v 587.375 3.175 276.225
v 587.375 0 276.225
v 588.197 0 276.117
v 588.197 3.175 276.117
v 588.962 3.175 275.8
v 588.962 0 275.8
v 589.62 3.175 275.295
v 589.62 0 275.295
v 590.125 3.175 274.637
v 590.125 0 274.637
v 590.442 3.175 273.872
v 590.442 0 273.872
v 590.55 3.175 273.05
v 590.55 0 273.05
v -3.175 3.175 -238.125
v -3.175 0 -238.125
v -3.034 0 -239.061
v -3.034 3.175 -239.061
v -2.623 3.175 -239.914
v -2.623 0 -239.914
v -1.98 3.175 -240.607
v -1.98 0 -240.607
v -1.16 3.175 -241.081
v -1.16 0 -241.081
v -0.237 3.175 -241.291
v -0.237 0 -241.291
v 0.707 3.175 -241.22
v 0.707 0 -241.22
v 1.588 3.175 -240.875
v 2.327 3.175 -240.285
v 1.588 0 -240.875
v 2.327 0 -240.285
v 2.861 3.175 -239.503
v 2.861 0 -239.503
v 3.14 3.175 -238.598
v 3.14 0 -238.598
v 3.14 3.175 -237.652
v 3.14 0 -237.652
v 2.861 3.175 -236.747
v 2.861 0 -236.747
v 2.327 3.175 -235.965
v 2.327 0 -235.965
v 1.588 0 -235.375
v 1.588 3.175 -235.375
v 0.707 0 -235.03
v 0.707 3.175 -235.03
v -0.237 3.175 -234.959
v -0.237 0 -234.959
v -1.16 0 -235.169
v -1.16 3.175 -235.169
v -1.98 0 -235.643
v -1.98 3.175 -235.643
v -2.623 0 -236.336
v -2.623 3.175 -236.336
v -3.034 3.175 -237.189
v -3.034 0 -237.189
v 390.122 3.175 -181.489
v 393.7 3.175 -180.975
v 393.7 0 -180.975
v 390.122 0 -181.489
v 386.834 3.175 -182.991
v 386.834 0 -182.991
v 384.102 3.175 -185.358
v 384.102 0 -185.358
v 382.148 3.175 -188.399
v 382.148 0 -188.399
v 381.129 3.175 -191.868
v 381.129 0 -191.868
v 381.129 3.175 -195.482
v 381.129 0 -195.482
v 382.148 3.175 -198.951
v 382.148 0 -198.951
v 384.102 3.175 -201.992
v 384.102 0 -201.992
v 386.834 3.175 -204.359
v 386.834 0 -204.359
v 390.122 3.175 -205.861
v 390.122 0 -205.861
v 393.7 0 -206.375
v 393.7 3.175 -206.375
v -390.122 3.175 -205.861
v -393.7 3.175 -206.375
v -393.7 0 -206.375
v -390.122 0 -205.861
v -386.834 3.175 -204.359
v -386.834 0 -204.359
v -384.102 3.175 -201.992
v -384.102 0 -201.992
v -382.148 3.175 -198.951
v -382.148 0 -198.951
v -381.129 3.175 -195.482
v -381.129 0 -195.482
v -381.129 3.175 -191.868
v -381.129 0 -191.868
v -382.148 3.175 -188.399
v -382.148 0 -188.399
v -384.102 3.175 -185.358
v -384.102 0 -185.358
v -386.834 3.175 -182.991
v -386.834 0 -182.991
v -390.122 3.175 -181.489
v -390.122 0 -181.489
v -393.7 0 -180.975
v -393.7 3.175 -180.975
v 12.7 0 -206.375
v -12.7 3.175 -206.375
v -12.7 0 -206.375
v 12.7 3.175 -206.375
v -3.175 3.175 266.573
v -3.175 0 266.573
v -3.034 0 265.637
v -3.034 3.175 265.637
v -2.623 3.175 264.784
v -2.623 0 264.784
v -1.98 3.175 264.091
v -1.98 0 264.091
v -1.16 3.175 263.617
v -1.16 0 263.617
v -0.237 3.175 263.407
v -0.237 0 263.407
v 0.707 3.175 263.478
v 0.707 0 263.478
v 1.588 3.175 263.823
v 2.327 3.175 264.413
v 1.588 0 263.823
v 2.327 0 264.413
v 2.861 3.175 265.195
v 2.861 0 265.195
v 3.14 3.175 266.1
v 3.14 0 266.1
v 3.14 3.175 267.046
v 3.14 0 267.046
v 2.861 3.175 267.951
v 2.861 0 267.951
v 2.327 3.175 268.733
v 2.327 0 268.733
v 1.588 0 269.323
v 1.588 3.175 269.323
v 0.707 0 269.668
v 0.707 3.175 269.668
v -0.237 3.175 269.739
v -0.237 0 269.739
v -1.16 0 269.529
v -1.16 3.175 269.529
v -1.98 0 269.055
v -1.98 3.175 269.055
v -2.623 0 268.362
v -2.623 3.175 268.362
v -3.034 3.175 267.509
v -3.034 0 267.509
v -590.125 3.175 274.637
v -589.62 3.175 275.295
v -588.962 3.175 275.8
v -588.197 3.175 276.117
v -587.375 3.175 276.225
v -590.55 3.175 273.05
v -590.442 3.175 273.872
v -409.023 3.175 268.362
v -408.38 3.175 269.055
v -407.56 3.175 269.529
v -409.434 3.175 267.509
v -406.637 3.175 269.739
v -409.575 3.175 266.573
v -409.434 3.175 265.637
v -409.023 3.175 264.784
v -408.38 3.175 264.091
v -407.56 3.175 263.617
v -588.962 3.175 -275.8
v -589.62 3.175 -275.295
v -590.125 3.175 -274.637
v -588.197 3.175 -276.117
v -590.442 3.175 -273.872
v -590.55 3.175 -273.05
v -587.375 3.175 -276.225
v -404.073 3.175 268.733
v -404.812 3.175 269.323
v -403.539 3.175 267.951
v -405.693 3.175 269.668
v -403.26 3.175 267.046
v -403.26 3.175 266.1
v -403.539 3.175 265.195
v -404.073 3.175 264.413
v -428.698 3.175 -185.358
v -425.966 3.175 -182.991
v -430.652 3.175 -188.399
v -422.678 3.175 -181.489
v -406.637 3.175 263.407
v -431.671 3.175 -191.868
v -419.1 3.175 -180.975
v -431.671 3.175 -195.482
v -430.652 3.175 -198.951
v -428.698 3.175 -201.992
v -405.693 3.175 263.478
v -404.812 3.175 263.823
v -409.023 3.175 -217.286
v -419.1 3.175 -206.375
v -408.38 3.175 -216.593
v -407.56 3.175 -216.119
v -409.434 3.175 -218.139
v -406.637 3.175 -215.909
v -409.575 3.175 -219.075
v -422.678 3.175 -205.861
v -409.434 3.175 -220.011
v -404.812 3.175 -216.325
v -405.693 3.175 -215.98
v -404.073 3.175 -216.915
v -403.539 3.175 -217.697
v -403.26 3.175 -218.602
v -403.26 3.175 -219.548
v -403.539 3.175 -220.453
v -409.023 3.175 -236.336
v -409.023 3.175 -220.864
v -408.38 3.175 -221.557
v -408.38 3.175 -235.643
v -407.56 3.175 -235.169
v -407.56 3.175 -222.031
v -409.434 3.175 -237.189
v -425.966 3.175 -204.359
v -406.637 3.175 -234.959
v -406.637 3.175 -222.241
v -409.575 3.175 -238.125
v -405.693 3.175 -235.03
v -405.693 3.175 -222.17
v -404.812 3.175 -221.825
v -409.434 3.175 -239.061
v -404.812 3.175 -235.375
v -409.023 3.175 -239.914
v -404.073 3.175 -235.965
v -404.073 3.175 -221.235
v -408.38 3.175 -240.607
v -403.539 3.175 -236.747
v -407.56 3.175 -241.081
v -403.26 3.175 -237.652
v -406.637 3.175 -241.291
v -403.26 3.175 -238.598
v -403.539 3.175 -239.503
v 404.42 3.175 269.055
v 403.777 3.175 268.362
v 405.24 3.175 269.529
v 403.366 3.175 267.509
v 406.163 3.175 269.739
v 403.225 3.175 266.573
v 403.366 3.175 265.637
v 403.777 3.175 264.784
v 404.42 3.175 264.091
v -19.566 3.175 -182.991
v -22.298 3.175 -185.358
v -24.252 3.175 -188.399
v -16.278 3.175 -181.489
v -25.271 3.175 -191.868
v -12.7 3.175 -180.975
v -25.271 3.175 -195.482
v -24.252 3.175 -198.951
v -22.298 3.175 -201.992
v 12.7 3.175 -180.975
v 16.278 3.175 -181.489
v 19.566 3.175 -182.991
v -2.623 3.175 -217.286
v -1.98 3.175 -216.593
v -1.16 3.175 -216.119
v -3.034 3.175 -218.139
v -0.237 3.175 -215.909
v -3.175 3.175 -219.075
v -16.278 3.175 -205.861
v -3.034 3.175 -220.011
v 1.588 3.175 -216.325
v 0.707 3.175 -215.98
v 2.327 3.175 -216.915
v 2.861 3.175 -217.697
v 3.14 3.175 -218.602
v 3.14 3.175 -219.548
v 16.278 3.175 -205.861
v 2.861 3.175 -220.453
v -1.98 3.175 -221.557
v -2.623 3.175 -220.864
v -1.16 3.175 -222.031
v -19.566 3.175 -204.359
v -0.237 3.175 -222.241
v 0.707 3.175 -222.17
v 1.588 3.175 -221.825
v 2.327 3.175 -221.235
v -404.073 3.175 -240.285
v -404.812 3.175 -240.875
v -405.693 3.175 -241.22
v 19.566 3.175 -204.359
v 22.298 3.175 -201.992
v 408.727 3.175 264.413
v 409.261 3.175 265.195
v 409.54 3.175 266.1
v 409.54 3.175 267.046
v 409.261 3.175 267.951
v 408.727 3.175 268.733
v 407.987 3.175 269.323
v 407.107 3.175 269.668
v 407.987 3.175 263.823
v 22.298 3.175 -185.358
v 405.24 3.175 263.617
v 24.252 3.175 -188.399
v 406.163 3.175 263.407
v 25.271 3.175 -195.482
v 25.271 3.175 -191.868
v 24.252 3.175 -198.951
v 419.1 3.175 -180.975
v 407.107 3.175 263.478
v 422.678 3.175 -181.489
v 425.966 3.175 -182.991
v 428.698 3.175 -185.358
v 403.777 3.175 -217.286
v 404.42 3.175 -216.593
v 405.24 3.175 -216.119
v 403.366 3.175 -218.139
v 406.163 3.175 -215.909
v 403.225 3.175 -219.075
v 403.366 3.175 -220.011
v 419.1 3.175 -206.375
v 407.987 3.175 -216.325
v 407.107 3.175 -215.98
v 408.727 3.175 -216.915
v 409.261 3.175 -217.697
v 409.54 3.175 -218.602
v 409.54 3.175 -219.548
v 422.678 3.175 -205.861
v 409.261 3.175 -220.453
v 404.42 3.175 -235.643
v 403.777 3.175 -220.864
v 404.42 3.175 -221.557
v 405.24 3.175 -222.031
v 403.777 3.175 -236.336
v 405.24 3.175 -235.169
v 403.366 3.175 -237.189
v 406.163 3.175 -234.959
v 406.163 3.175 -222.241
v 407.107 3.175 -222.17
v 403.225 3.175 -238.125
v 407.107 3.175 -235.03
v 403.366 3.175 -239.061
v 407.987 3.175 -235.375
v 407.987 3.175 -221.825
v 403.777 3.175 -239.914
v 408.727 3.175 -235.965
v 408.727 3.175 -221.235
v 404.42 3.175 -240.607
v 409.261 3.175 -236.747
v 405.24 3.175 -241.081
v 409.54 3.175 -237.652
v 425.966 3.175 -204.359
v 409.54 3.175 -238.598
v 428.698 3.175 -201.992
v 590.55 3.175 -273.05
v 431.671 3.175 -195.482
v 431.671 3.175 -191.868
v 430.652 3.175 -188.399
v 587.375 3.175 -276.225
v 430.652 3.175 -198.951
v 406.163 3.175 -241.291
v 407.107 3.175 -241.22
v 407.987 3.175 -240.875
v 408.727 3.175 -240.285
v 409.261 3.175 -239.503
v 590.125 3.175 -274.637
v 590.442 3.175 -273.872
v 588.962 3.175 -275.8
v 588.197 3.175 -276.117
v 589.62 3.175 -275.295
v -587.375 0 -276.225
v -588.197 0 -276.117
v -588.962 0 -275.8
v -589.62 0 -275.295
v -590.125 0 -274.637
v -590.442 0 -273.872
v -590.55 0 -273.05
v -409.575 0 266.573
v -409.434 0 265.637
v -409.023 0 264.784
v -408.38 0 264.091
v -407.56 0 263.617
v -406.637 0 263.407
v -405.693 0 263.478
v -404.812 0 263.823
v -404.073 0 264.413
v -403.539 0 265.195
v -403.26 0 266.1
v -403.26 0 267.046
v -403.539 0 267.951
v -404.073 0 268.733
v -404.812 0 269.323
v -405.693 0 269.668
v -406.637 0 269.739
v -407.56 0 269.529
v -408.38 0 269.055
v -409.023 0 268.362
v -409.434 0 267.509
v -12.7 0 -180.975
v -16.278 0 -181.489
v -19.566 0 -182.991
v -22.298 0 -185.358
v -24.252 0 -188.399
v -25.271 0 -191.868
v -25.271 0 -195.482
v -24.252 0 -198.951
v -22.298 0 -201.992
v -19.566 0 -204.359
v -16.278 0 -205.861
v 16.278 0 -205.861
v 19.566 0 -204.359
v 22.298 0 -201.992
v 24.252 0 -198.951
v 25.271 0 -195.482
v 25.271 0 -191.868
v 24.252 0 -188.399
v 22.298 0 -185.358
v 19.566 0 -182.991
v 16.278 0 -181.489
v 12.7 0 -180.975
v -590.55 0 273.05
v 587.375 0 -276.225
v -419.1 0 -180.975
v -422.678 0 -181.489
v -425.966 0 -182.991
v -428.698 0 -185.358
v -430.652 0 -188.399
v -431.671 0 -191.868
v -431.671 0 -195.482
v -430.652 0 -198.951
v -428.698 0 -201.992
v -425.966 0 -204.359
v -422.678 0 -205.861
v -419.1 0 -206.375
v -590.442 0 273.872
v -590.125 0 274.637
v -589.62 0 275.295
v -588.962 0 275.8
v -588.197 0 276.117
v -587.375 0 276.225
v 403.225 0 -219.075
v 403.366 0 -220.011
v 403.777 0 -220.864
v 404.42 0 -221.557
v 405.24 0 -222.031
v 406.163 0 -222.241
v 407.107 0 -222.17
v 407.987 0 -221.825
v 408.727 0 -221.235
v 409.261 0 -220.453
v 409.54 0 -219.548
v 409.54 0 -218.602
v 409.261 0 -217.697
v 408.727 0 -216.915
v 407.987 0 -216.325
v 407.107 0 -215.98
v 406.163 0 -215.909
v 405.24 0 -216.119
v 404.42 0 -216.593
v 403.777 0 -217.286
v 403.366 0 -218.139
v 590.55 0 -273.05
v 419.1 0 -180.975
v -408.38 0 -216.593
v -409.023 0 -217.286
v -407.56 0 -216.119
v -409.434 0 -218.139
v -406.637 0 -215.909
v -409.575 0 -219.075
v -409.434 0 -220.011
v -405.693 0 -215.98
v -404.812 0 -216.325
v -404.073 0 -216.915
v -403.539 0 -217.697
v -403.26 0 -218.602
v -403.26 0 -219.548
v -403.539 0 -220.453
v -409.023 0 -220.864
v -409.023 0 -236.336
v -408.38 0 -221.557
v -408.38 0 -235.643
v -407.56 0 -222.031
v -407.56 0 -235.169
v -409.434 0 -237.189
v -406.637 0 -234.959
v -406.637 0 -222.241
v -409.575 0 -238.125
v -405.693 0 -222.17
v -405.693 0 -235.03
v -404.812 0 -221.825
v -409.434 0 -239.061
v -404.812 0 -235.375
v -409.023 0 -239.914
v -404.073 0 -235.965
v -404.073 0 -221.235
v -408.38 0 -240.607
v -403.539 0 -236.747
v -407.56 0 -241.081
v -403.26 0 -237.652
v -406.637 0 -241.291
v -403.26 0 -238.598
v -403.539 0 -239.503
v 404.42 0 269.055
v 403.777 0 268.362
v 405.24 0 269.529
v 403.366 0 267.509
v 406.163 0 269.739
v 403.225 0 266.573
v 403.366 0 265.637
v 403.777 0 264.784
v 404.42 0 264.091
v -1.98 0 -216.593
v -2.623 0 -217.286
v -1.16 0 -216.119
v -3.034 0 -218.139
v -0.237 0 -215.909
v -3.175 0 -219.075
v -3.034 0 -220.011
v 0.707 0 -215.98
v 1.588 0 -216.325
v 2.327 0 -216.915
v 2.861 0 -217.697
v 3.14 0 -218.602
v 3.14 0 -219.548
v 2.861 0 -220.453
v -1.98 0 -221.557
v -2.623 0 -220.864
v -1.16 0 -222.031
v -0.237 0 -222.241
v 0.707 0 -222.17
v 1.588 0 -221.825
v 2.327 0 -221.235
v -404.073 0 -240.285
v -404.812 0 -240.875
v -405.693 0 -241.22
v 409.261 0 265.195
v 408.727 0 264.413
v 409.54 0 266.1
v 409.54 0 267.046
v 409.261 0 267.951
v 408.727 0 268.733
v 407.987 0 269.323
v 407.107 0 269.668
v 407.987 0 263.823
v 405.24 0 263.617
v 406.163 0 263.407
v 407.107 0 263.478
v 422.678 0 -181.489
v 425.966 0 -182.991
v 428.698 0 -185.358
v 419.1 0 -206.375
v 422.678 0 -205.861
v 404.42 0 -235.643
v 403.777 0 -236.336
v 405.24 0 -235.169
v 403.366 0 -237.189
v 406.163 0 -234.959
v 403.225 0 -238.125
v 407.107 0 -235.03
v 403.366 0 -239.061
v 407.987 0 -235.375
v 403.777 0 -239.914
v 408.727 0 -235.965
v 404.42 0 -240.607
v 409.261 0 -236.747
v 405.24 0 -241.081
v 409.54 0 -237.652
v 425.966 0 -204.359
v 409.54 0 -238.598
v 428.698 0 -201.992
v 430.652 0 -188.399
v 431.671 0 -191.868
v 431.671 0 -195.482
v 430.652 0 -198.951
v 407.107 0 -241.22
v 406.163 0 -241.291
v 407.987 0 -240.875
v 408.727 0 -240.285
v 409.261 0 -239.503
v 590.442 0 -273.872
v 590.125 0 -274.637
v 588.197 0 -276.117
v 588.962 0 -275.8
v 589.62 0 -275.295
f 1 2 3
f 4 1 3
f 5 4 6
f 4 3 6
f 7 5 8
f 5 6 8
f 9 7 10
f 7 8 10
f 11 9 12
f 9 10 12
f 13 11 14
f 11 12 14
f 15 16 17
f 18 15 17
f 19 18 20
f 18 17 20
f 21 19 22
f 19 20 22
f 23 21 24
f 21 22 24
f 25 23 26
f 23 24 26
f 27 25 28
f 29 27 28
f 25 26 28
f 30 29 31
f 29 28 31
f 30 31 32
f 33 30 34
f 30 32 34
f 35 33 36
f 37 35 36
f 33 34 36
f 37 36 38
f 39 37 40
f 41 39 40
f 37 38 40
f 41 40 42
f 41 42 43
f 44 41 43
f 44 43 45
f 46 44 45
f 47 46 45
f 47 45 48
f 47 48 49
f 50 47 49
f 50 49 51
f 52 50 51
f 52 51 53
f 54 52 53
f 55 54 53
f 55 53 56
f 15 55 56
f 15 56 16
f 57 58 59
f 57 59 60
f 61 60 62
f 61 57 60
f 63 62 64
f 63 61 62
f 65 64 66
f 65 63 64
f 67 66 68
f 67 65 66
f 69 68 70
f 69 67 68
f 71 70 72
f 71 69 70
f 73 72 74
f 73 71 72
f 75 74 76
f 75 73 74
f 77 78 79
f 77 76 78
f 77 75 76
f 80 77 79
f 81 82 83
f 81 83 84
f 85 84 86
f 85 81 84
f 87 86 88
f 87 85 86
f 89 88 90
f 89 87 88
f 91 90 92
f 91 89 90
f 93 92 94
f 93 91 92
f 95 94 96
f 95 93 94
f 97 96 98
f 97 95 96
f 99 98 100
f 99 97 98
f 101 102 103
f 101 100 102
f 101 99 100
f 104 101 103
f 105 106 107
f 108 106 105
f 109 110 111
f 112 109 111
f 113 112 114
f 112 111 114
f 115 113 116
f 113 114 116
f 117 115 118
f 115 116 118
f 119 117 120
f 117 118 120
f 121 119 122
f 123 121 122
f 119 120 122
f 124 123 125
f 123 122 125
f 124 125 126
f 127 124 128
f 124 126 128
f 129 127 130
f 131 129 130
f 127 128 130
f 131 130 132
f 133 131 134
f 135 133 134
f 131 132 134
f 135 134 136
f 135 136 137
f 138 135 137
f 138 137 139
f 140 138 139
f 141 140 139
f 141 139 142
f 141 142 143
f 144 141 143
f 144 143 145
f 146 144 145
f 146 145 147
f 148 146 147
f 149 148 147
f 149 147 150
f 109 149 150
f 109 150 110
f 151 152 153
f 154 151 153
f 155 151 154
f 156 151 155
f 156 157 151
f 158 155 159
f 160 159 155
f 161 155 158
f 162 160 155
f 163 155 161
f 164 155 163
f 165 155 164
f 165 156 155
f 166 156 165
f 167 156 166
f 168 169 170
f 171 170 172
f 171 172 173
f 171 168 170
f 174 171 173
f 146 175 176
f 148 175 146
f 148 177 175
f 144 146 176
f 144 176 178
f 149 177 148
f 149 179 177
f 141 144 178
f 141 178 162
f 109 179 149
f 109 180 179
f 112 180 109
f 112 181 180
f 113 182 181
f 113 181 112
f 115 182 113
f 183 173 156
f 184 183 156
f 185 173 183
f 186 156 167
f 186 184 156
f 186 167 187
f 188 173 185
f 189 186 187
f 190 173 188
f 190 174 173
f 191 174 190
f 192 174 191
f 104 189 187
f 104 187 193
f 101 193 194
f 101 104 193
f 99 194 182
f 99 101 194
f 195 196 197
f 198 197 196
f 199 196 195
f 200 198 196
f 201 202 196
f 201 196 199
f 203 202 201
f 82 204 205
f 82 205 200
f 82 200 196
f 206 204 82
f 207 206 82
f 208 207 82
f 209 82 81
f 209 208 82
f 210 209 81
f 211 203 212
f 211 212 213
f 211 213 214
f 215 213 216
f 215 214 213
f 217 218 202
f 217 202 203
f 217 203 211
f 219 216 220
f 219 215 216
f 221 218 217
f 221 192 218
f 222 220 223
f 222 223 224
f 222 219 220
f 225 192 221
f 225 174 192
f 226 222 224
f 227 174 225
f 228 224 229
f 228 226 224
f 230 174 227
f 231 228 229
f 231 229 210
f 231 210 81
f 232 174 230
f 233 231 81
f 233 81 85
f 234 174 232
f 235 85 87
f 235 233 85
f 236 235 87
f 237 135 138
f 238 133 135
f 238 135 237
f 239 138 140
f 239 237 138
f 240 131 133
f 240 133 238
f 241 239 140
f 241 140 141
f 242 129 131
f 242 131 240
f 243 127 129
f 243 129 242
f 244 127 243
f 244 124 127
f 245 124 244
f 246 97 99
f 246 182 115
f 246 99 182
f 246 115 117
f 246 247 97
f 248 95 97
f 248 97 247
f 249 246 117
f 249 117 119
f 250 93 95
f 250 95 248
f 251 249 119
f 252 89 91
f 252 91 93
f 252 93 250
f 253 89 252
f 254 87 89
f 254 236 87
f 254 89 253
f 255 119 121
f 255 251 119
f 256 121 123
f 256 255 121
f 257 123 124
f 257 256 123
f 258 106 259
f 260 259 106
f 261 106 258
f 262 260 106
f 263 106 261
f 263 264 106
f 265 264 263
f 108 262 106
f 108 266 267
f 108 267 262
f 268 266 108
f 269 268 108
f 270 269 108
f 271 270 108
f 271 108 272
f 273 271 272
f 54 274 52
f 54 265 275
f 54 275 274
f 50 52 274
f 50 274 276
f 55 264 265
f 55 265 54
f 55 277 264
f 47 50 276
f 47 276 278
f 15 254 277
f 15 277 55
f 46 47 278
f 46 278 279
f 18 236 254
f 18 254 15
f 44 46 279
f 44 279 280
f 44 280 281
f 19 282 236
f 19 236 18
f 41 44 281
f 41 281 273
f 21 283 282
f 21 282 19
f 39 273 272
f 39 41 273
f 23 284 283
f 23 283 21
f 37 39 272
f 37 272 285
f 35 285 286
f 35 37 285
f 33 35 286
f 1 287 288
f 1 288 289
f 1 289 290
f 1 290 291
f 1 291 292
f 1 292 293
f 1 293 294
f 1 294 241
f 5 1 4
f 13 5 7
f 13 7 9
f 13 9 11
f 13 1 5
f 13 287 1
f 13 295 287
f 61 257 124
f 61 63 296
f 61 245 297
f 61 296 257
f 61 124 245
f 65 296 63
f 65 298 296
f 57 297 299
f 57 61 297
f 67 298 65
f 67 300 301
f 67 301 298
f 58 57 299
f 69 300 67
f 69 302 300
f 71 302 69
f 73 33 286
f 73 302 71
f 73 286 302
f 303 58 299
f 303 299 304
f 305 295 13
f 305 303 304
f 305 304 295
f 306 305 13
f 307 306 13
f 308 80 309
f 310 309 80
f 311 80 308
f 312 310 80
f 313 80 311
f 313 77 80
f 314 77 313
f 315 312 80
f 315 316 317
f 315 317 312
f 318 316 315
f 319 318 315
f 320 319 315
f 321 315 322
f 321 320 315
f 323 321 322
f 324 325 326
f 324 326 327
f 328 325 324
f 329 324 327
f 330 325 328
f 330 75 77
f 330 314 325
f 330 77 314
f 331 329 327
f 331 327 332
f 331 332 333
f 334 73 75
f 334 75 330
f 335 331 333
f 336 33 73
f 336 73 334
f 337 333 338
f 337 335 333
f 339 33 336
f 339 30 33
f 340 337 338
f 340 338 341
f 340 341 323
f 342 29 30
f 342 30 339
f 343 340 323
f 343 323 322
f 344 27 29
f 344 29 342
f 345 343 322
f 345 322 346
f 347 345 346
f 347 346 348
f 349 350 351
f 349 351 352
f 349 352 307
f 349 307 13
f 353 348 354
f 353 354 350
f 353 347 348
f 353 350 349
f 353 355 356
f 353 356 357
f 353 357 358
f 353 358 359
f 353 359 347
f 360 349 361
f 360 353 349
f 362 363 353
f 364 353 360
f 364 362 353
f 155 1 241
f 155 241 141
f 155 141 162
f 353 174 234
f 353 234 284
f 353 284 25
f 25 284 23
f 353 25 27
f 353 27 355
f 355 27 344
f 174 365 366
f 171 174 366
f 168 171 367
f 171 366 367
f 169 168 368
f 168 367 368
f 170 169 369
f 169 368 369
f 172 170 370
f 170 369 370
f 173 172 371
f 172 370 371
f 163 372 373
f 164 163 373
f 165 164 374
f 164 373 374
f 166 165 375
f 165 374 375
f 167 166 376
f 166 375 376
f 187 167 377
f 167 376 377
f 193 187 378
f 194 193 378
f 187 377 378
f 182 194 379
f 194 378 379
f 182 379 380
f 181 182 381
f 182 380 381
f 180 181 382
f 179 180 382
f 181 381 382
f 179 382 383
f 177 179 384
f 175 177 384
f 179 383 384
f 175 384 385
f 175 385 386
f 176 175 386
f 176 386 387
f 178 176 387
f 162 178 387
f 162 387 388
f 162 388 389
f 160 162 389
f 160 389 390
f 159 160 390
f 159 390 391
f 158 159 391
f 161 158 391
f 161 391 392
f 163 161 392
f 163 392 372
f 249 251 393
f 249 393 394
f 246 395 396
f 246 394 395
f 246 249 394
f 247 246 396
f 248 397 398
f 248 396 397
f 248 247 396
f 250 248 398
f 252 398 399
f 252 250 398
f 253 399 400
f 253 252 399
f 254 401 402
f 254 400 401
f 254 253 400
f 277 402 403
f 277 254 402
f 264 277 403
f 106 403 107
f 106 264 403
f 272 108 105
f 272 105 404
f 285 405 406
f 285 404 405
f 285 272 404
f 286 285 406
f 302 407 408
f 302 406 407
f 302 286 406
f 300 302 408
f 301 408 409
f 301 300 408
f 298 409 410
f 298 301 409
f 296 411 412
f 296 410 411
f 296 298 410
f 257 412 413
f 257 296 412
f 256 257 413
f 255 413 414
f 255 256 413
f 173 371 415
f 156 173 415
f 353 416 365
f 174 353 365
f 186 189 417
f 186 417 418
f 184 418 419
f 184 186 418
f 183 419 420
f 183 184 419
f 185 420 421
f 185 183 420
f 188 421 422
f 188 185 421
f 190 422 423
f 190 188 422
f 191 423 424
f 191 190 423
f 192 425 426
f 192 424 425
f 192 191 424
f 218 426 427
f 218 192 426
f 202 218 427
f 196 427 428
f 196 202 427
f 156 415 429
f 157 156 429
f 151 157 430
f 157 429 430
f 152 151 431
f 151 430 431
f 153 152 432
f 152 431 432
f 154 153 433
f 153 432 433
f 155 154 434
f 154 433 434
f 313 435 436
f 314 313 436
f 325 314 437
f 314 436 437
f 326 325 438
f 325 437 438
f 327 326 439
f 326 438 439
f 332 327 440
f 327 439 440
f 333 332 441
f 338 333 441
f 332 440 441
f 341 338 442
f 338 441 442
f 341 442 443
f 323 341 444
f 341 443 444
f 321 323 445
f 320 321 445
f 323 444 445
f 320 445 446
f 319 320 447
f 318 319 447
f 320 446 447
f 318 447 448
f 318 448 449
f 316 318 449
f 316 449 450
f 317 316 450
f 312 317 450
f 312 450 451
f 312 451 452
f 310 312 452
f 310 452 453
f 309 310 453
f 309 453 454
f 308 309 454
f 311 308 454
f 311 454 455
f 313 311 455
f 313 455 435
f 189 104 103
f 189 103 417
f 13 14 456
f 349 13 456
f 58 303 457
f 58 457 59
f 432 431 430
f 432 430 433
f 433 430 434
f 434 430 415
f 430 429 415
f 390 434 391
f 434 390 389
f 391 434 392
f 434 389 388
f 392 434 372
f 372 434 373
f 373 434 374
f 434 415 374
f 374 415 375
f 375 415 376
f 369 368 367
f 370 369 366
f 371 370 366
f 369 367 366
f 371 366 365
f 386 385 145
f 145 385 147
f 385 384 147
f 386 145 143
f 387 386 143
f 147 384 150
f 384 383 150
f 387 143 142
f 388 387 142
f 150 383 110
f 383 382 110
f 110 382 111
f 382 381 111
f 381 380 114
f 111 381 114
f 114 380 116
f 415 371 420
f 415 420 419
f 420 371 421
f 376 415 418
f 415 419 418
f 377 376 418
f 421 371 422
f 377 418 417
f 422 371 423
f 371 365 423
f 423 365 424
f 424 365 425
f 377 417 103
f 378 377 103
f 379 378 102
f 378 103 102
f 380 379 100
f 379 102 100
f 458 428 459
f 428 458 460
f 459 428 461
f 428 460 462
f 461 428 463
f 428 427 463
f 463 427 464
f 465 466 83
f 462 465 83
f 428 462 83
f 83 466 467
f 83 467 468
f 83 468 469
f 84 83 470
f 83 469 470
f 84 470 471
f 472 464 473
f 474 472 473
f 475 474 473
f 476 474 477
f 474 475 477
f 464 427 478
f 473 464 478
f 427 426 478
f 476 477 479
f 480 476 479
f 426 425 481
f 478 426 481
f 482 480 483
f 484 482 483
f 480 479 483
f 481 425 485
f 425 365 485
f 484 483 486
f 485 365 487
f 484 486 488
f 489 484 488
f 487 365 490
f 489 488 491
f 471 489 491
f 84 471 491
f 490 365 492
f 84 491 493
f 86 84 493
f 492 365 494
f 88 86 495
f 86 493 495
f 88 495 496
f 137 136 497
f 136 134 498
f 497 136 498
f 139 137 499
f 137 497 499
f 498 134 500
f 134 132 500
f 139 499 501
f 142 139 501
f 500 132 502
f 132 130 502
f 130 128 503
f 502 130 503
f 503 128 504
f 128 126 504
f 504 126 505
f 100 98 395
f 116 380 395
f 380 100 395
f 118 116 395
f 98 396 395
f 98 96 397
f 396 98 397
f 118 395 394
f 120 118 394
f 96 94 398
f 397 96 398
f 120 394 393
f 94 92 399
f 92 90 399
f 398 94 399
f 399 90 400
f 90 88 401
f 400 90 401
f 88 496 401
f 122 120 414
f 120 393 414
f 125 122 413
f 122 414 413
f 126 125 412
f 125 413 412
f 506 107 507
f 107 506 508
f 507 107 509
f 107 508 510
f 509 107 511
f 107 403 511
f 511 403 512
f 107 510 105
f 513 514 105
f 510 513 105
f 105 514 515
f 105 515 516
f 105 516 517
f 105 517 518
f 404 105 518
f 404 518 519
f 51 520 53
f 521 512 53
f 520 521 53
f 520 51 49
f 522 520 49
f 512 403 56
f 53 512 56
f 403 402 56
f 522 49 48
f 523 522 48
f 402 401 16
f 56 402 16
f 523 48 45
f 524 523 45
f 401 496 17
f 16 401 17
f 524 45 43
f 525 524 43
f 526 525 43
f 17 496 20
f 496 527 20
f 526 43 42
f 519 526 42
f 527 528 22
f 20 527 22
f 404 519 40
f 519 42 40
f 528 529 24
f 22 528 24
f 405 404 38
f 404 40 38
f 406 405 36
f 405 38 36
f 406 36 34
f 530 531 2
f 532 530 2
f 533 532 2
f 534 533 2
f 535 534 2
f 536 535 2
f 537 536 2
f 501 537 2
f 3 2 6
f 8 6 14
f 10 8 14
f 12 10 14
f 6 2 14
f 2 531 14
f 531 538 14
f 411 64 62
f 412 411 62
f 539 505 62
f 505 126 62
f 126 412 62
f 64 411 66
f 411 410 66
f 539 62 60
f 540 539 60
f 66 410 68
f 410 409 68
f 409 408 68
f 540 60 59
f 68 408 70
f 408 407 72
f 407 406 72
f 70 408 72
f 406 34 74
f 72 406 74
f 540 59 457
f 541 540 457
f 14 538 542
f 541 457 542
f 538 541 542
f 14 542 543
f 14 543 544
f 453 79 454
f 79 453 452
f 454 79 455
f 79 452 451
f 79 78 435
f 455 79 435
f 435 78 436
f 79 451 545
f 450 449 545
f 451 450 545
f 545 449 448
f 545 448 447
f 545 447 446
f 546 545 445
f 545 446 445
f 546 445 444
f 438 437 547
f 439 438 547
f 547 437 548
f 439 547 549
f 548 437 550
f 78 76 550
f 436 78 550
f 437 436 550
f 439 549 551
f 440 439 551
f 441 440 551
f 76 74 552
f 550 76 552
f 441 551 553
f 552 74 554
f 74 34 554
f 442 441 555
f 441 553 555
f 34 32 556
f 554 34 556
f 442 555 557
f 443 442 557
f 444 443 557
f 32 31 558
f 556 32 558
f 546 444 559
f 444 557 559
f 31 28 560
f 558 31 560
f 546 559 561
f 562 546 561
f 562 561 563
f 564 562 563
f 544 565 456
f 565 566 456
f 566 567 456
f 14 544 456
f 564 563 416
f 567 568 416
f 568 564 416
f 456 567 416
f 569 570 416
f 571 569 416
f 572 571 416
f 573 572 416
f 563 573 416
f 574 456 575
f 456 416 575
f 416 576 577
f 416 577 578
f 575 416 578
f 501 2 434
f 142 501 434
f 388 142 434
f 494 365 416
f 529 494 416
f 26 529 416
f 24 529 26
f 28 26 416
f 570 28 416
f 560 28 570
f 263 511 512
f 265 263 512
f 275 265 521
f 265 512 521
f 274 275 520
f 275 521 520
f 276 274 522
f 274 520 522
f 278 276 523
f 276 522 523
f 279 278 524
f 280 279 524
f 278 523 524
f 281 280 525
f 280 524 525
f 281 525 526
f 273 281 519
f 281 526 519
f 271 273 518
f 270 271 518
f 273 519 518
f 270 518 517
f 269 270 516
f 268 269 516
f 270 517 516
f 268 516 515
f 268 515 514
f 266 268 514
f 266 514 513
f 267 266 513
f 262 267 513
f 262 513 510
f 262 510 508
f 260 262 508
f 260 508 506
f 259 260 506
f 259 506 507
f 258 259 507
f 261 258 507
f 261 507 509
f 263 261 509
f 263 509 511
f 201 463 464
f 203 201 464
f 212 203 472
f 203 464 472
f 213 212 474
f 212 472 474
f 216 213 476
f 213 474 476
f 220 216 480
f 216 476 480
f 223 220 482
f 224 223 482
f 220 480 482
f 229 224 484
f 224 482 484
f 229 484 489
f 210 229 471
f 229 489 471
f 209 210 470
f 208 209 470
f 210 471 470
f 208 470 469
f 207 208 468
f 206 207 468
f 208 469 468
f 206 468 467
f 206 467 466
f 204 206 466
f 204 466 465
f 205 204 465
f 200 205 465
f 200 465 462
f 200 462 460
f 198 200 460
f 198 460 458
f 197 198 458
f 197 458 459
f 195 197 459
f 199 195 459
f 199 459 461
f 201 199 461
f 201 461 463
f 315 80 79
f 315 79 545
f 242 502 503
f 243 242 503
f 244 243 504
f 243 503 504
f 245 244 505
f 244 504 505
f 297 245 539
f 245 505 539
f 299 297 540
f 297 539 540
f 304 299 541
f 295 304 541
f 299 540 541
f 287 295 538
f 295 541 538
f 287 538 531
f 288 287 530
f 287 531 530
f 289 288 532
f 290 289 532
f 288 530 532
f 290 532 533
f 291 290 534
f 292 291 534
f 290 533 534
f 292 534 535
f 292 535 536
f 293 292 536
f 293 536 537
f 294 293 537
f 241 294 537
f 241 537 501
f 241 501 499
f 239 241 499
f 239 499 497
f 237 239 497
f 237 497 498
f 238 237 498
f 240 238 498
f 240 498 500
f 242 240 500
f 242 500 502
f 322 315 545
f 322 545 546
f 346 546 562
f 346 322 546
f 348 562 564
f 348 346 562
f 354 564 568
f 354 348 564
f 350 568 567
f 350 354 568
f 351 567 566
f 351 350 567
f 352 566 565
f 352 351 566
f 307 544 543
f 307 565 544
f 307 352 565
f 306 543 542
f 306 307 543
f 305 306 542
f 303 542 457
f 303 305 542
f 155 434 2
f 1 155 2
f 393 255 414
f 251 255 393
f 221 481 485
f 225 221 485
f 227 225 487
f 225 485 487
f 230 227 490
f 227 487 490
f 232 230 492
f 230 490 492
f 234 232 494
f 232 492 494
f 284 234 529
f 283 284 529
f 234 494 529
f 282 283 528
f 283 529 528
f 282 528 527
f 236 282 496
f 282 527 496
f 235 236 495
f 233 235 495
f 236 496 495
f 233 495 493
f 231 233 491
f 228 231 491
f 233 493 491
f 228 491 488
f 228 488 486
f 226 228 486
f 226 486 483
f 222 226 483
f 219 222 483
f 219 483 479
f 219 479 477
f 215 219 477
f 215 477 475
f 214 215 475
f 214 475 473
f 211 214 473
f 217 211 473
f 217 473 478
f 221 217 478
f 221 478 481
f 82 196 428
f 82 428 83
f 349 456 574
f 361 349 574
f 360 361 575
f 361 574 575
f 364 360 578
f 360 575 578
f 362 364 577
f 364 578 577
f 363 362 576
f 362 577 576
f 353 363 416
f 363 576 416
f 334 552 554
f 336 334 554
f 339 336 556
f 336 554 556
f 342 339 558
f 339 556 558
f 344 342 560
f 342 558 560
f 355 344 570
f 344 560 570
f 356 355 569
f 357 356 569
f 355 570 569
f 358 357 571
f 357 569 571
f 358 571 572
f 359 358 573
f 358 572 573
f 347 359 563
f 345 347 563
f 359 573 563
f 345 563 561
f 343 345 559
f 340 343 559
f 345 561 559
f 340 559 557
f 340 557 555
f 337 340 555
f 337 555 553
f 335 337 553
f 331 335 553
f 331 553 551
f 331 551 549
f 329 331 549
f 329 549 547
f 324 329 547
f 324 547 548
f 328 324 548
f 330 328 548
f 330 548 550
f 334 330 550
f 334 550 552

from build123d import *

# Parameters (mm, degrees)
BOSS_EXTRUDE1_DEPTH         = 3.175
F_1_4_0_25_DIAMETER_HOLE1_D = 6.35
CUT_EXTRUDE1_DEPTH          = 652.965975914


with BuildPart() as part:
    # Sketch1 → Boss-Extrude1 (new body)
    with BuildSketch(Plane(origin=(0, 0, 0), x_dir=(1, 0, 0), z_dir=(0, 1, 0))):
        with BuildLine():
            Line((-587.375, -276.225), (587.375, -276.225))
            ThreePointArc((587.375, -276.225), (589.62006403, -275.29506403), (590.55, -273.05))
            Line((590.55, -273.05), (590.55, 273.05))
            ThreePointArc((590.55, 273.05), (589.62006403, 275.29506403), (587.375, 276.225))
            Line((587.375, 276.225), (-587.375, 276.225))
            ThreePointArc((-587.375, 276.225), (-589.62006403, 275.29506403), (-590.55, 273.05))
            Line((-590.55, 273.05), (-590.55, -273.05))
            ThreePointArc((-590.55, -273.05), (-589.62006403, -275.29506403), (-587.375, -276.225))
        make_face()
    extrude(amount=BOSS_EXTRUDE1_DEPTH)

    # 1/4 (0.25) Diameter Hole1 (through all)
    with Locations(Plane(origin=(0, 3.175, 0), x_dir=(1, 0, 0), z_dir=(0, 1, 0))):
        with Locations((-406.4, 219.075), (0, 219.075), (406.4, 219.075), (-406.4, -266.573), (0, -266.573), (406.4, -266.573), (-406.4, 238.125), (0, 238.125), (406.4, 238.125)):
            Hole(F_1_4_0_25_DIAMETER_HOLE1_D / 2)

    # Sketch5 → Cut-Extrude1 (cut, through all)
    with BuildSketch(Plane(origin=(0, 3.175, 0), x_dir=(1, 0, 0), z_dir=(0, 1, 0))):
        with BuildLine():
            Line((-419.1, 206.375), (-393.7, 206.375))
            ThreePointArc((-393.7, 206.375), (-381, 193.675), (-393.7, 180.975))
            Line((-393.7, 180.975), (-419.1, 180.975))
            ThreePointArc((-419.1, 180.975), (-431.8, 193.675), (-419.1, 206.375))
        make_face()
        with BuildLine():
            Line((-12.7, 206.375), (12.7, 206.375))
            ThreePointArc((12.7, 206.375), (25.4, 193.675), (12.7, 180.975))
            Line((12.7, 180.975), (-12.7, 180.975))
            ThreePointArc((-12.7, 180.975), (-25.4, 193.675), (-12.7, 206.375))
        make_face()
        with BuildLine():
            Line((393.7, 206.375), (419.1, 206.375))
            ThreePointArc((419.1, 206.375), (431.8, 193.675), (419.1, 180.975))
            Line((419.1, 180.975), (393.7, 180.975))
            ThreePointArc((393.7, 180.975), (381, 193.675), (393.7, 206.375))
        make_face()
    extrude(amount=-CUT_EXTRUDE1_DEPTH, mode=Mode.SUBTRACT)


solid = part.part
